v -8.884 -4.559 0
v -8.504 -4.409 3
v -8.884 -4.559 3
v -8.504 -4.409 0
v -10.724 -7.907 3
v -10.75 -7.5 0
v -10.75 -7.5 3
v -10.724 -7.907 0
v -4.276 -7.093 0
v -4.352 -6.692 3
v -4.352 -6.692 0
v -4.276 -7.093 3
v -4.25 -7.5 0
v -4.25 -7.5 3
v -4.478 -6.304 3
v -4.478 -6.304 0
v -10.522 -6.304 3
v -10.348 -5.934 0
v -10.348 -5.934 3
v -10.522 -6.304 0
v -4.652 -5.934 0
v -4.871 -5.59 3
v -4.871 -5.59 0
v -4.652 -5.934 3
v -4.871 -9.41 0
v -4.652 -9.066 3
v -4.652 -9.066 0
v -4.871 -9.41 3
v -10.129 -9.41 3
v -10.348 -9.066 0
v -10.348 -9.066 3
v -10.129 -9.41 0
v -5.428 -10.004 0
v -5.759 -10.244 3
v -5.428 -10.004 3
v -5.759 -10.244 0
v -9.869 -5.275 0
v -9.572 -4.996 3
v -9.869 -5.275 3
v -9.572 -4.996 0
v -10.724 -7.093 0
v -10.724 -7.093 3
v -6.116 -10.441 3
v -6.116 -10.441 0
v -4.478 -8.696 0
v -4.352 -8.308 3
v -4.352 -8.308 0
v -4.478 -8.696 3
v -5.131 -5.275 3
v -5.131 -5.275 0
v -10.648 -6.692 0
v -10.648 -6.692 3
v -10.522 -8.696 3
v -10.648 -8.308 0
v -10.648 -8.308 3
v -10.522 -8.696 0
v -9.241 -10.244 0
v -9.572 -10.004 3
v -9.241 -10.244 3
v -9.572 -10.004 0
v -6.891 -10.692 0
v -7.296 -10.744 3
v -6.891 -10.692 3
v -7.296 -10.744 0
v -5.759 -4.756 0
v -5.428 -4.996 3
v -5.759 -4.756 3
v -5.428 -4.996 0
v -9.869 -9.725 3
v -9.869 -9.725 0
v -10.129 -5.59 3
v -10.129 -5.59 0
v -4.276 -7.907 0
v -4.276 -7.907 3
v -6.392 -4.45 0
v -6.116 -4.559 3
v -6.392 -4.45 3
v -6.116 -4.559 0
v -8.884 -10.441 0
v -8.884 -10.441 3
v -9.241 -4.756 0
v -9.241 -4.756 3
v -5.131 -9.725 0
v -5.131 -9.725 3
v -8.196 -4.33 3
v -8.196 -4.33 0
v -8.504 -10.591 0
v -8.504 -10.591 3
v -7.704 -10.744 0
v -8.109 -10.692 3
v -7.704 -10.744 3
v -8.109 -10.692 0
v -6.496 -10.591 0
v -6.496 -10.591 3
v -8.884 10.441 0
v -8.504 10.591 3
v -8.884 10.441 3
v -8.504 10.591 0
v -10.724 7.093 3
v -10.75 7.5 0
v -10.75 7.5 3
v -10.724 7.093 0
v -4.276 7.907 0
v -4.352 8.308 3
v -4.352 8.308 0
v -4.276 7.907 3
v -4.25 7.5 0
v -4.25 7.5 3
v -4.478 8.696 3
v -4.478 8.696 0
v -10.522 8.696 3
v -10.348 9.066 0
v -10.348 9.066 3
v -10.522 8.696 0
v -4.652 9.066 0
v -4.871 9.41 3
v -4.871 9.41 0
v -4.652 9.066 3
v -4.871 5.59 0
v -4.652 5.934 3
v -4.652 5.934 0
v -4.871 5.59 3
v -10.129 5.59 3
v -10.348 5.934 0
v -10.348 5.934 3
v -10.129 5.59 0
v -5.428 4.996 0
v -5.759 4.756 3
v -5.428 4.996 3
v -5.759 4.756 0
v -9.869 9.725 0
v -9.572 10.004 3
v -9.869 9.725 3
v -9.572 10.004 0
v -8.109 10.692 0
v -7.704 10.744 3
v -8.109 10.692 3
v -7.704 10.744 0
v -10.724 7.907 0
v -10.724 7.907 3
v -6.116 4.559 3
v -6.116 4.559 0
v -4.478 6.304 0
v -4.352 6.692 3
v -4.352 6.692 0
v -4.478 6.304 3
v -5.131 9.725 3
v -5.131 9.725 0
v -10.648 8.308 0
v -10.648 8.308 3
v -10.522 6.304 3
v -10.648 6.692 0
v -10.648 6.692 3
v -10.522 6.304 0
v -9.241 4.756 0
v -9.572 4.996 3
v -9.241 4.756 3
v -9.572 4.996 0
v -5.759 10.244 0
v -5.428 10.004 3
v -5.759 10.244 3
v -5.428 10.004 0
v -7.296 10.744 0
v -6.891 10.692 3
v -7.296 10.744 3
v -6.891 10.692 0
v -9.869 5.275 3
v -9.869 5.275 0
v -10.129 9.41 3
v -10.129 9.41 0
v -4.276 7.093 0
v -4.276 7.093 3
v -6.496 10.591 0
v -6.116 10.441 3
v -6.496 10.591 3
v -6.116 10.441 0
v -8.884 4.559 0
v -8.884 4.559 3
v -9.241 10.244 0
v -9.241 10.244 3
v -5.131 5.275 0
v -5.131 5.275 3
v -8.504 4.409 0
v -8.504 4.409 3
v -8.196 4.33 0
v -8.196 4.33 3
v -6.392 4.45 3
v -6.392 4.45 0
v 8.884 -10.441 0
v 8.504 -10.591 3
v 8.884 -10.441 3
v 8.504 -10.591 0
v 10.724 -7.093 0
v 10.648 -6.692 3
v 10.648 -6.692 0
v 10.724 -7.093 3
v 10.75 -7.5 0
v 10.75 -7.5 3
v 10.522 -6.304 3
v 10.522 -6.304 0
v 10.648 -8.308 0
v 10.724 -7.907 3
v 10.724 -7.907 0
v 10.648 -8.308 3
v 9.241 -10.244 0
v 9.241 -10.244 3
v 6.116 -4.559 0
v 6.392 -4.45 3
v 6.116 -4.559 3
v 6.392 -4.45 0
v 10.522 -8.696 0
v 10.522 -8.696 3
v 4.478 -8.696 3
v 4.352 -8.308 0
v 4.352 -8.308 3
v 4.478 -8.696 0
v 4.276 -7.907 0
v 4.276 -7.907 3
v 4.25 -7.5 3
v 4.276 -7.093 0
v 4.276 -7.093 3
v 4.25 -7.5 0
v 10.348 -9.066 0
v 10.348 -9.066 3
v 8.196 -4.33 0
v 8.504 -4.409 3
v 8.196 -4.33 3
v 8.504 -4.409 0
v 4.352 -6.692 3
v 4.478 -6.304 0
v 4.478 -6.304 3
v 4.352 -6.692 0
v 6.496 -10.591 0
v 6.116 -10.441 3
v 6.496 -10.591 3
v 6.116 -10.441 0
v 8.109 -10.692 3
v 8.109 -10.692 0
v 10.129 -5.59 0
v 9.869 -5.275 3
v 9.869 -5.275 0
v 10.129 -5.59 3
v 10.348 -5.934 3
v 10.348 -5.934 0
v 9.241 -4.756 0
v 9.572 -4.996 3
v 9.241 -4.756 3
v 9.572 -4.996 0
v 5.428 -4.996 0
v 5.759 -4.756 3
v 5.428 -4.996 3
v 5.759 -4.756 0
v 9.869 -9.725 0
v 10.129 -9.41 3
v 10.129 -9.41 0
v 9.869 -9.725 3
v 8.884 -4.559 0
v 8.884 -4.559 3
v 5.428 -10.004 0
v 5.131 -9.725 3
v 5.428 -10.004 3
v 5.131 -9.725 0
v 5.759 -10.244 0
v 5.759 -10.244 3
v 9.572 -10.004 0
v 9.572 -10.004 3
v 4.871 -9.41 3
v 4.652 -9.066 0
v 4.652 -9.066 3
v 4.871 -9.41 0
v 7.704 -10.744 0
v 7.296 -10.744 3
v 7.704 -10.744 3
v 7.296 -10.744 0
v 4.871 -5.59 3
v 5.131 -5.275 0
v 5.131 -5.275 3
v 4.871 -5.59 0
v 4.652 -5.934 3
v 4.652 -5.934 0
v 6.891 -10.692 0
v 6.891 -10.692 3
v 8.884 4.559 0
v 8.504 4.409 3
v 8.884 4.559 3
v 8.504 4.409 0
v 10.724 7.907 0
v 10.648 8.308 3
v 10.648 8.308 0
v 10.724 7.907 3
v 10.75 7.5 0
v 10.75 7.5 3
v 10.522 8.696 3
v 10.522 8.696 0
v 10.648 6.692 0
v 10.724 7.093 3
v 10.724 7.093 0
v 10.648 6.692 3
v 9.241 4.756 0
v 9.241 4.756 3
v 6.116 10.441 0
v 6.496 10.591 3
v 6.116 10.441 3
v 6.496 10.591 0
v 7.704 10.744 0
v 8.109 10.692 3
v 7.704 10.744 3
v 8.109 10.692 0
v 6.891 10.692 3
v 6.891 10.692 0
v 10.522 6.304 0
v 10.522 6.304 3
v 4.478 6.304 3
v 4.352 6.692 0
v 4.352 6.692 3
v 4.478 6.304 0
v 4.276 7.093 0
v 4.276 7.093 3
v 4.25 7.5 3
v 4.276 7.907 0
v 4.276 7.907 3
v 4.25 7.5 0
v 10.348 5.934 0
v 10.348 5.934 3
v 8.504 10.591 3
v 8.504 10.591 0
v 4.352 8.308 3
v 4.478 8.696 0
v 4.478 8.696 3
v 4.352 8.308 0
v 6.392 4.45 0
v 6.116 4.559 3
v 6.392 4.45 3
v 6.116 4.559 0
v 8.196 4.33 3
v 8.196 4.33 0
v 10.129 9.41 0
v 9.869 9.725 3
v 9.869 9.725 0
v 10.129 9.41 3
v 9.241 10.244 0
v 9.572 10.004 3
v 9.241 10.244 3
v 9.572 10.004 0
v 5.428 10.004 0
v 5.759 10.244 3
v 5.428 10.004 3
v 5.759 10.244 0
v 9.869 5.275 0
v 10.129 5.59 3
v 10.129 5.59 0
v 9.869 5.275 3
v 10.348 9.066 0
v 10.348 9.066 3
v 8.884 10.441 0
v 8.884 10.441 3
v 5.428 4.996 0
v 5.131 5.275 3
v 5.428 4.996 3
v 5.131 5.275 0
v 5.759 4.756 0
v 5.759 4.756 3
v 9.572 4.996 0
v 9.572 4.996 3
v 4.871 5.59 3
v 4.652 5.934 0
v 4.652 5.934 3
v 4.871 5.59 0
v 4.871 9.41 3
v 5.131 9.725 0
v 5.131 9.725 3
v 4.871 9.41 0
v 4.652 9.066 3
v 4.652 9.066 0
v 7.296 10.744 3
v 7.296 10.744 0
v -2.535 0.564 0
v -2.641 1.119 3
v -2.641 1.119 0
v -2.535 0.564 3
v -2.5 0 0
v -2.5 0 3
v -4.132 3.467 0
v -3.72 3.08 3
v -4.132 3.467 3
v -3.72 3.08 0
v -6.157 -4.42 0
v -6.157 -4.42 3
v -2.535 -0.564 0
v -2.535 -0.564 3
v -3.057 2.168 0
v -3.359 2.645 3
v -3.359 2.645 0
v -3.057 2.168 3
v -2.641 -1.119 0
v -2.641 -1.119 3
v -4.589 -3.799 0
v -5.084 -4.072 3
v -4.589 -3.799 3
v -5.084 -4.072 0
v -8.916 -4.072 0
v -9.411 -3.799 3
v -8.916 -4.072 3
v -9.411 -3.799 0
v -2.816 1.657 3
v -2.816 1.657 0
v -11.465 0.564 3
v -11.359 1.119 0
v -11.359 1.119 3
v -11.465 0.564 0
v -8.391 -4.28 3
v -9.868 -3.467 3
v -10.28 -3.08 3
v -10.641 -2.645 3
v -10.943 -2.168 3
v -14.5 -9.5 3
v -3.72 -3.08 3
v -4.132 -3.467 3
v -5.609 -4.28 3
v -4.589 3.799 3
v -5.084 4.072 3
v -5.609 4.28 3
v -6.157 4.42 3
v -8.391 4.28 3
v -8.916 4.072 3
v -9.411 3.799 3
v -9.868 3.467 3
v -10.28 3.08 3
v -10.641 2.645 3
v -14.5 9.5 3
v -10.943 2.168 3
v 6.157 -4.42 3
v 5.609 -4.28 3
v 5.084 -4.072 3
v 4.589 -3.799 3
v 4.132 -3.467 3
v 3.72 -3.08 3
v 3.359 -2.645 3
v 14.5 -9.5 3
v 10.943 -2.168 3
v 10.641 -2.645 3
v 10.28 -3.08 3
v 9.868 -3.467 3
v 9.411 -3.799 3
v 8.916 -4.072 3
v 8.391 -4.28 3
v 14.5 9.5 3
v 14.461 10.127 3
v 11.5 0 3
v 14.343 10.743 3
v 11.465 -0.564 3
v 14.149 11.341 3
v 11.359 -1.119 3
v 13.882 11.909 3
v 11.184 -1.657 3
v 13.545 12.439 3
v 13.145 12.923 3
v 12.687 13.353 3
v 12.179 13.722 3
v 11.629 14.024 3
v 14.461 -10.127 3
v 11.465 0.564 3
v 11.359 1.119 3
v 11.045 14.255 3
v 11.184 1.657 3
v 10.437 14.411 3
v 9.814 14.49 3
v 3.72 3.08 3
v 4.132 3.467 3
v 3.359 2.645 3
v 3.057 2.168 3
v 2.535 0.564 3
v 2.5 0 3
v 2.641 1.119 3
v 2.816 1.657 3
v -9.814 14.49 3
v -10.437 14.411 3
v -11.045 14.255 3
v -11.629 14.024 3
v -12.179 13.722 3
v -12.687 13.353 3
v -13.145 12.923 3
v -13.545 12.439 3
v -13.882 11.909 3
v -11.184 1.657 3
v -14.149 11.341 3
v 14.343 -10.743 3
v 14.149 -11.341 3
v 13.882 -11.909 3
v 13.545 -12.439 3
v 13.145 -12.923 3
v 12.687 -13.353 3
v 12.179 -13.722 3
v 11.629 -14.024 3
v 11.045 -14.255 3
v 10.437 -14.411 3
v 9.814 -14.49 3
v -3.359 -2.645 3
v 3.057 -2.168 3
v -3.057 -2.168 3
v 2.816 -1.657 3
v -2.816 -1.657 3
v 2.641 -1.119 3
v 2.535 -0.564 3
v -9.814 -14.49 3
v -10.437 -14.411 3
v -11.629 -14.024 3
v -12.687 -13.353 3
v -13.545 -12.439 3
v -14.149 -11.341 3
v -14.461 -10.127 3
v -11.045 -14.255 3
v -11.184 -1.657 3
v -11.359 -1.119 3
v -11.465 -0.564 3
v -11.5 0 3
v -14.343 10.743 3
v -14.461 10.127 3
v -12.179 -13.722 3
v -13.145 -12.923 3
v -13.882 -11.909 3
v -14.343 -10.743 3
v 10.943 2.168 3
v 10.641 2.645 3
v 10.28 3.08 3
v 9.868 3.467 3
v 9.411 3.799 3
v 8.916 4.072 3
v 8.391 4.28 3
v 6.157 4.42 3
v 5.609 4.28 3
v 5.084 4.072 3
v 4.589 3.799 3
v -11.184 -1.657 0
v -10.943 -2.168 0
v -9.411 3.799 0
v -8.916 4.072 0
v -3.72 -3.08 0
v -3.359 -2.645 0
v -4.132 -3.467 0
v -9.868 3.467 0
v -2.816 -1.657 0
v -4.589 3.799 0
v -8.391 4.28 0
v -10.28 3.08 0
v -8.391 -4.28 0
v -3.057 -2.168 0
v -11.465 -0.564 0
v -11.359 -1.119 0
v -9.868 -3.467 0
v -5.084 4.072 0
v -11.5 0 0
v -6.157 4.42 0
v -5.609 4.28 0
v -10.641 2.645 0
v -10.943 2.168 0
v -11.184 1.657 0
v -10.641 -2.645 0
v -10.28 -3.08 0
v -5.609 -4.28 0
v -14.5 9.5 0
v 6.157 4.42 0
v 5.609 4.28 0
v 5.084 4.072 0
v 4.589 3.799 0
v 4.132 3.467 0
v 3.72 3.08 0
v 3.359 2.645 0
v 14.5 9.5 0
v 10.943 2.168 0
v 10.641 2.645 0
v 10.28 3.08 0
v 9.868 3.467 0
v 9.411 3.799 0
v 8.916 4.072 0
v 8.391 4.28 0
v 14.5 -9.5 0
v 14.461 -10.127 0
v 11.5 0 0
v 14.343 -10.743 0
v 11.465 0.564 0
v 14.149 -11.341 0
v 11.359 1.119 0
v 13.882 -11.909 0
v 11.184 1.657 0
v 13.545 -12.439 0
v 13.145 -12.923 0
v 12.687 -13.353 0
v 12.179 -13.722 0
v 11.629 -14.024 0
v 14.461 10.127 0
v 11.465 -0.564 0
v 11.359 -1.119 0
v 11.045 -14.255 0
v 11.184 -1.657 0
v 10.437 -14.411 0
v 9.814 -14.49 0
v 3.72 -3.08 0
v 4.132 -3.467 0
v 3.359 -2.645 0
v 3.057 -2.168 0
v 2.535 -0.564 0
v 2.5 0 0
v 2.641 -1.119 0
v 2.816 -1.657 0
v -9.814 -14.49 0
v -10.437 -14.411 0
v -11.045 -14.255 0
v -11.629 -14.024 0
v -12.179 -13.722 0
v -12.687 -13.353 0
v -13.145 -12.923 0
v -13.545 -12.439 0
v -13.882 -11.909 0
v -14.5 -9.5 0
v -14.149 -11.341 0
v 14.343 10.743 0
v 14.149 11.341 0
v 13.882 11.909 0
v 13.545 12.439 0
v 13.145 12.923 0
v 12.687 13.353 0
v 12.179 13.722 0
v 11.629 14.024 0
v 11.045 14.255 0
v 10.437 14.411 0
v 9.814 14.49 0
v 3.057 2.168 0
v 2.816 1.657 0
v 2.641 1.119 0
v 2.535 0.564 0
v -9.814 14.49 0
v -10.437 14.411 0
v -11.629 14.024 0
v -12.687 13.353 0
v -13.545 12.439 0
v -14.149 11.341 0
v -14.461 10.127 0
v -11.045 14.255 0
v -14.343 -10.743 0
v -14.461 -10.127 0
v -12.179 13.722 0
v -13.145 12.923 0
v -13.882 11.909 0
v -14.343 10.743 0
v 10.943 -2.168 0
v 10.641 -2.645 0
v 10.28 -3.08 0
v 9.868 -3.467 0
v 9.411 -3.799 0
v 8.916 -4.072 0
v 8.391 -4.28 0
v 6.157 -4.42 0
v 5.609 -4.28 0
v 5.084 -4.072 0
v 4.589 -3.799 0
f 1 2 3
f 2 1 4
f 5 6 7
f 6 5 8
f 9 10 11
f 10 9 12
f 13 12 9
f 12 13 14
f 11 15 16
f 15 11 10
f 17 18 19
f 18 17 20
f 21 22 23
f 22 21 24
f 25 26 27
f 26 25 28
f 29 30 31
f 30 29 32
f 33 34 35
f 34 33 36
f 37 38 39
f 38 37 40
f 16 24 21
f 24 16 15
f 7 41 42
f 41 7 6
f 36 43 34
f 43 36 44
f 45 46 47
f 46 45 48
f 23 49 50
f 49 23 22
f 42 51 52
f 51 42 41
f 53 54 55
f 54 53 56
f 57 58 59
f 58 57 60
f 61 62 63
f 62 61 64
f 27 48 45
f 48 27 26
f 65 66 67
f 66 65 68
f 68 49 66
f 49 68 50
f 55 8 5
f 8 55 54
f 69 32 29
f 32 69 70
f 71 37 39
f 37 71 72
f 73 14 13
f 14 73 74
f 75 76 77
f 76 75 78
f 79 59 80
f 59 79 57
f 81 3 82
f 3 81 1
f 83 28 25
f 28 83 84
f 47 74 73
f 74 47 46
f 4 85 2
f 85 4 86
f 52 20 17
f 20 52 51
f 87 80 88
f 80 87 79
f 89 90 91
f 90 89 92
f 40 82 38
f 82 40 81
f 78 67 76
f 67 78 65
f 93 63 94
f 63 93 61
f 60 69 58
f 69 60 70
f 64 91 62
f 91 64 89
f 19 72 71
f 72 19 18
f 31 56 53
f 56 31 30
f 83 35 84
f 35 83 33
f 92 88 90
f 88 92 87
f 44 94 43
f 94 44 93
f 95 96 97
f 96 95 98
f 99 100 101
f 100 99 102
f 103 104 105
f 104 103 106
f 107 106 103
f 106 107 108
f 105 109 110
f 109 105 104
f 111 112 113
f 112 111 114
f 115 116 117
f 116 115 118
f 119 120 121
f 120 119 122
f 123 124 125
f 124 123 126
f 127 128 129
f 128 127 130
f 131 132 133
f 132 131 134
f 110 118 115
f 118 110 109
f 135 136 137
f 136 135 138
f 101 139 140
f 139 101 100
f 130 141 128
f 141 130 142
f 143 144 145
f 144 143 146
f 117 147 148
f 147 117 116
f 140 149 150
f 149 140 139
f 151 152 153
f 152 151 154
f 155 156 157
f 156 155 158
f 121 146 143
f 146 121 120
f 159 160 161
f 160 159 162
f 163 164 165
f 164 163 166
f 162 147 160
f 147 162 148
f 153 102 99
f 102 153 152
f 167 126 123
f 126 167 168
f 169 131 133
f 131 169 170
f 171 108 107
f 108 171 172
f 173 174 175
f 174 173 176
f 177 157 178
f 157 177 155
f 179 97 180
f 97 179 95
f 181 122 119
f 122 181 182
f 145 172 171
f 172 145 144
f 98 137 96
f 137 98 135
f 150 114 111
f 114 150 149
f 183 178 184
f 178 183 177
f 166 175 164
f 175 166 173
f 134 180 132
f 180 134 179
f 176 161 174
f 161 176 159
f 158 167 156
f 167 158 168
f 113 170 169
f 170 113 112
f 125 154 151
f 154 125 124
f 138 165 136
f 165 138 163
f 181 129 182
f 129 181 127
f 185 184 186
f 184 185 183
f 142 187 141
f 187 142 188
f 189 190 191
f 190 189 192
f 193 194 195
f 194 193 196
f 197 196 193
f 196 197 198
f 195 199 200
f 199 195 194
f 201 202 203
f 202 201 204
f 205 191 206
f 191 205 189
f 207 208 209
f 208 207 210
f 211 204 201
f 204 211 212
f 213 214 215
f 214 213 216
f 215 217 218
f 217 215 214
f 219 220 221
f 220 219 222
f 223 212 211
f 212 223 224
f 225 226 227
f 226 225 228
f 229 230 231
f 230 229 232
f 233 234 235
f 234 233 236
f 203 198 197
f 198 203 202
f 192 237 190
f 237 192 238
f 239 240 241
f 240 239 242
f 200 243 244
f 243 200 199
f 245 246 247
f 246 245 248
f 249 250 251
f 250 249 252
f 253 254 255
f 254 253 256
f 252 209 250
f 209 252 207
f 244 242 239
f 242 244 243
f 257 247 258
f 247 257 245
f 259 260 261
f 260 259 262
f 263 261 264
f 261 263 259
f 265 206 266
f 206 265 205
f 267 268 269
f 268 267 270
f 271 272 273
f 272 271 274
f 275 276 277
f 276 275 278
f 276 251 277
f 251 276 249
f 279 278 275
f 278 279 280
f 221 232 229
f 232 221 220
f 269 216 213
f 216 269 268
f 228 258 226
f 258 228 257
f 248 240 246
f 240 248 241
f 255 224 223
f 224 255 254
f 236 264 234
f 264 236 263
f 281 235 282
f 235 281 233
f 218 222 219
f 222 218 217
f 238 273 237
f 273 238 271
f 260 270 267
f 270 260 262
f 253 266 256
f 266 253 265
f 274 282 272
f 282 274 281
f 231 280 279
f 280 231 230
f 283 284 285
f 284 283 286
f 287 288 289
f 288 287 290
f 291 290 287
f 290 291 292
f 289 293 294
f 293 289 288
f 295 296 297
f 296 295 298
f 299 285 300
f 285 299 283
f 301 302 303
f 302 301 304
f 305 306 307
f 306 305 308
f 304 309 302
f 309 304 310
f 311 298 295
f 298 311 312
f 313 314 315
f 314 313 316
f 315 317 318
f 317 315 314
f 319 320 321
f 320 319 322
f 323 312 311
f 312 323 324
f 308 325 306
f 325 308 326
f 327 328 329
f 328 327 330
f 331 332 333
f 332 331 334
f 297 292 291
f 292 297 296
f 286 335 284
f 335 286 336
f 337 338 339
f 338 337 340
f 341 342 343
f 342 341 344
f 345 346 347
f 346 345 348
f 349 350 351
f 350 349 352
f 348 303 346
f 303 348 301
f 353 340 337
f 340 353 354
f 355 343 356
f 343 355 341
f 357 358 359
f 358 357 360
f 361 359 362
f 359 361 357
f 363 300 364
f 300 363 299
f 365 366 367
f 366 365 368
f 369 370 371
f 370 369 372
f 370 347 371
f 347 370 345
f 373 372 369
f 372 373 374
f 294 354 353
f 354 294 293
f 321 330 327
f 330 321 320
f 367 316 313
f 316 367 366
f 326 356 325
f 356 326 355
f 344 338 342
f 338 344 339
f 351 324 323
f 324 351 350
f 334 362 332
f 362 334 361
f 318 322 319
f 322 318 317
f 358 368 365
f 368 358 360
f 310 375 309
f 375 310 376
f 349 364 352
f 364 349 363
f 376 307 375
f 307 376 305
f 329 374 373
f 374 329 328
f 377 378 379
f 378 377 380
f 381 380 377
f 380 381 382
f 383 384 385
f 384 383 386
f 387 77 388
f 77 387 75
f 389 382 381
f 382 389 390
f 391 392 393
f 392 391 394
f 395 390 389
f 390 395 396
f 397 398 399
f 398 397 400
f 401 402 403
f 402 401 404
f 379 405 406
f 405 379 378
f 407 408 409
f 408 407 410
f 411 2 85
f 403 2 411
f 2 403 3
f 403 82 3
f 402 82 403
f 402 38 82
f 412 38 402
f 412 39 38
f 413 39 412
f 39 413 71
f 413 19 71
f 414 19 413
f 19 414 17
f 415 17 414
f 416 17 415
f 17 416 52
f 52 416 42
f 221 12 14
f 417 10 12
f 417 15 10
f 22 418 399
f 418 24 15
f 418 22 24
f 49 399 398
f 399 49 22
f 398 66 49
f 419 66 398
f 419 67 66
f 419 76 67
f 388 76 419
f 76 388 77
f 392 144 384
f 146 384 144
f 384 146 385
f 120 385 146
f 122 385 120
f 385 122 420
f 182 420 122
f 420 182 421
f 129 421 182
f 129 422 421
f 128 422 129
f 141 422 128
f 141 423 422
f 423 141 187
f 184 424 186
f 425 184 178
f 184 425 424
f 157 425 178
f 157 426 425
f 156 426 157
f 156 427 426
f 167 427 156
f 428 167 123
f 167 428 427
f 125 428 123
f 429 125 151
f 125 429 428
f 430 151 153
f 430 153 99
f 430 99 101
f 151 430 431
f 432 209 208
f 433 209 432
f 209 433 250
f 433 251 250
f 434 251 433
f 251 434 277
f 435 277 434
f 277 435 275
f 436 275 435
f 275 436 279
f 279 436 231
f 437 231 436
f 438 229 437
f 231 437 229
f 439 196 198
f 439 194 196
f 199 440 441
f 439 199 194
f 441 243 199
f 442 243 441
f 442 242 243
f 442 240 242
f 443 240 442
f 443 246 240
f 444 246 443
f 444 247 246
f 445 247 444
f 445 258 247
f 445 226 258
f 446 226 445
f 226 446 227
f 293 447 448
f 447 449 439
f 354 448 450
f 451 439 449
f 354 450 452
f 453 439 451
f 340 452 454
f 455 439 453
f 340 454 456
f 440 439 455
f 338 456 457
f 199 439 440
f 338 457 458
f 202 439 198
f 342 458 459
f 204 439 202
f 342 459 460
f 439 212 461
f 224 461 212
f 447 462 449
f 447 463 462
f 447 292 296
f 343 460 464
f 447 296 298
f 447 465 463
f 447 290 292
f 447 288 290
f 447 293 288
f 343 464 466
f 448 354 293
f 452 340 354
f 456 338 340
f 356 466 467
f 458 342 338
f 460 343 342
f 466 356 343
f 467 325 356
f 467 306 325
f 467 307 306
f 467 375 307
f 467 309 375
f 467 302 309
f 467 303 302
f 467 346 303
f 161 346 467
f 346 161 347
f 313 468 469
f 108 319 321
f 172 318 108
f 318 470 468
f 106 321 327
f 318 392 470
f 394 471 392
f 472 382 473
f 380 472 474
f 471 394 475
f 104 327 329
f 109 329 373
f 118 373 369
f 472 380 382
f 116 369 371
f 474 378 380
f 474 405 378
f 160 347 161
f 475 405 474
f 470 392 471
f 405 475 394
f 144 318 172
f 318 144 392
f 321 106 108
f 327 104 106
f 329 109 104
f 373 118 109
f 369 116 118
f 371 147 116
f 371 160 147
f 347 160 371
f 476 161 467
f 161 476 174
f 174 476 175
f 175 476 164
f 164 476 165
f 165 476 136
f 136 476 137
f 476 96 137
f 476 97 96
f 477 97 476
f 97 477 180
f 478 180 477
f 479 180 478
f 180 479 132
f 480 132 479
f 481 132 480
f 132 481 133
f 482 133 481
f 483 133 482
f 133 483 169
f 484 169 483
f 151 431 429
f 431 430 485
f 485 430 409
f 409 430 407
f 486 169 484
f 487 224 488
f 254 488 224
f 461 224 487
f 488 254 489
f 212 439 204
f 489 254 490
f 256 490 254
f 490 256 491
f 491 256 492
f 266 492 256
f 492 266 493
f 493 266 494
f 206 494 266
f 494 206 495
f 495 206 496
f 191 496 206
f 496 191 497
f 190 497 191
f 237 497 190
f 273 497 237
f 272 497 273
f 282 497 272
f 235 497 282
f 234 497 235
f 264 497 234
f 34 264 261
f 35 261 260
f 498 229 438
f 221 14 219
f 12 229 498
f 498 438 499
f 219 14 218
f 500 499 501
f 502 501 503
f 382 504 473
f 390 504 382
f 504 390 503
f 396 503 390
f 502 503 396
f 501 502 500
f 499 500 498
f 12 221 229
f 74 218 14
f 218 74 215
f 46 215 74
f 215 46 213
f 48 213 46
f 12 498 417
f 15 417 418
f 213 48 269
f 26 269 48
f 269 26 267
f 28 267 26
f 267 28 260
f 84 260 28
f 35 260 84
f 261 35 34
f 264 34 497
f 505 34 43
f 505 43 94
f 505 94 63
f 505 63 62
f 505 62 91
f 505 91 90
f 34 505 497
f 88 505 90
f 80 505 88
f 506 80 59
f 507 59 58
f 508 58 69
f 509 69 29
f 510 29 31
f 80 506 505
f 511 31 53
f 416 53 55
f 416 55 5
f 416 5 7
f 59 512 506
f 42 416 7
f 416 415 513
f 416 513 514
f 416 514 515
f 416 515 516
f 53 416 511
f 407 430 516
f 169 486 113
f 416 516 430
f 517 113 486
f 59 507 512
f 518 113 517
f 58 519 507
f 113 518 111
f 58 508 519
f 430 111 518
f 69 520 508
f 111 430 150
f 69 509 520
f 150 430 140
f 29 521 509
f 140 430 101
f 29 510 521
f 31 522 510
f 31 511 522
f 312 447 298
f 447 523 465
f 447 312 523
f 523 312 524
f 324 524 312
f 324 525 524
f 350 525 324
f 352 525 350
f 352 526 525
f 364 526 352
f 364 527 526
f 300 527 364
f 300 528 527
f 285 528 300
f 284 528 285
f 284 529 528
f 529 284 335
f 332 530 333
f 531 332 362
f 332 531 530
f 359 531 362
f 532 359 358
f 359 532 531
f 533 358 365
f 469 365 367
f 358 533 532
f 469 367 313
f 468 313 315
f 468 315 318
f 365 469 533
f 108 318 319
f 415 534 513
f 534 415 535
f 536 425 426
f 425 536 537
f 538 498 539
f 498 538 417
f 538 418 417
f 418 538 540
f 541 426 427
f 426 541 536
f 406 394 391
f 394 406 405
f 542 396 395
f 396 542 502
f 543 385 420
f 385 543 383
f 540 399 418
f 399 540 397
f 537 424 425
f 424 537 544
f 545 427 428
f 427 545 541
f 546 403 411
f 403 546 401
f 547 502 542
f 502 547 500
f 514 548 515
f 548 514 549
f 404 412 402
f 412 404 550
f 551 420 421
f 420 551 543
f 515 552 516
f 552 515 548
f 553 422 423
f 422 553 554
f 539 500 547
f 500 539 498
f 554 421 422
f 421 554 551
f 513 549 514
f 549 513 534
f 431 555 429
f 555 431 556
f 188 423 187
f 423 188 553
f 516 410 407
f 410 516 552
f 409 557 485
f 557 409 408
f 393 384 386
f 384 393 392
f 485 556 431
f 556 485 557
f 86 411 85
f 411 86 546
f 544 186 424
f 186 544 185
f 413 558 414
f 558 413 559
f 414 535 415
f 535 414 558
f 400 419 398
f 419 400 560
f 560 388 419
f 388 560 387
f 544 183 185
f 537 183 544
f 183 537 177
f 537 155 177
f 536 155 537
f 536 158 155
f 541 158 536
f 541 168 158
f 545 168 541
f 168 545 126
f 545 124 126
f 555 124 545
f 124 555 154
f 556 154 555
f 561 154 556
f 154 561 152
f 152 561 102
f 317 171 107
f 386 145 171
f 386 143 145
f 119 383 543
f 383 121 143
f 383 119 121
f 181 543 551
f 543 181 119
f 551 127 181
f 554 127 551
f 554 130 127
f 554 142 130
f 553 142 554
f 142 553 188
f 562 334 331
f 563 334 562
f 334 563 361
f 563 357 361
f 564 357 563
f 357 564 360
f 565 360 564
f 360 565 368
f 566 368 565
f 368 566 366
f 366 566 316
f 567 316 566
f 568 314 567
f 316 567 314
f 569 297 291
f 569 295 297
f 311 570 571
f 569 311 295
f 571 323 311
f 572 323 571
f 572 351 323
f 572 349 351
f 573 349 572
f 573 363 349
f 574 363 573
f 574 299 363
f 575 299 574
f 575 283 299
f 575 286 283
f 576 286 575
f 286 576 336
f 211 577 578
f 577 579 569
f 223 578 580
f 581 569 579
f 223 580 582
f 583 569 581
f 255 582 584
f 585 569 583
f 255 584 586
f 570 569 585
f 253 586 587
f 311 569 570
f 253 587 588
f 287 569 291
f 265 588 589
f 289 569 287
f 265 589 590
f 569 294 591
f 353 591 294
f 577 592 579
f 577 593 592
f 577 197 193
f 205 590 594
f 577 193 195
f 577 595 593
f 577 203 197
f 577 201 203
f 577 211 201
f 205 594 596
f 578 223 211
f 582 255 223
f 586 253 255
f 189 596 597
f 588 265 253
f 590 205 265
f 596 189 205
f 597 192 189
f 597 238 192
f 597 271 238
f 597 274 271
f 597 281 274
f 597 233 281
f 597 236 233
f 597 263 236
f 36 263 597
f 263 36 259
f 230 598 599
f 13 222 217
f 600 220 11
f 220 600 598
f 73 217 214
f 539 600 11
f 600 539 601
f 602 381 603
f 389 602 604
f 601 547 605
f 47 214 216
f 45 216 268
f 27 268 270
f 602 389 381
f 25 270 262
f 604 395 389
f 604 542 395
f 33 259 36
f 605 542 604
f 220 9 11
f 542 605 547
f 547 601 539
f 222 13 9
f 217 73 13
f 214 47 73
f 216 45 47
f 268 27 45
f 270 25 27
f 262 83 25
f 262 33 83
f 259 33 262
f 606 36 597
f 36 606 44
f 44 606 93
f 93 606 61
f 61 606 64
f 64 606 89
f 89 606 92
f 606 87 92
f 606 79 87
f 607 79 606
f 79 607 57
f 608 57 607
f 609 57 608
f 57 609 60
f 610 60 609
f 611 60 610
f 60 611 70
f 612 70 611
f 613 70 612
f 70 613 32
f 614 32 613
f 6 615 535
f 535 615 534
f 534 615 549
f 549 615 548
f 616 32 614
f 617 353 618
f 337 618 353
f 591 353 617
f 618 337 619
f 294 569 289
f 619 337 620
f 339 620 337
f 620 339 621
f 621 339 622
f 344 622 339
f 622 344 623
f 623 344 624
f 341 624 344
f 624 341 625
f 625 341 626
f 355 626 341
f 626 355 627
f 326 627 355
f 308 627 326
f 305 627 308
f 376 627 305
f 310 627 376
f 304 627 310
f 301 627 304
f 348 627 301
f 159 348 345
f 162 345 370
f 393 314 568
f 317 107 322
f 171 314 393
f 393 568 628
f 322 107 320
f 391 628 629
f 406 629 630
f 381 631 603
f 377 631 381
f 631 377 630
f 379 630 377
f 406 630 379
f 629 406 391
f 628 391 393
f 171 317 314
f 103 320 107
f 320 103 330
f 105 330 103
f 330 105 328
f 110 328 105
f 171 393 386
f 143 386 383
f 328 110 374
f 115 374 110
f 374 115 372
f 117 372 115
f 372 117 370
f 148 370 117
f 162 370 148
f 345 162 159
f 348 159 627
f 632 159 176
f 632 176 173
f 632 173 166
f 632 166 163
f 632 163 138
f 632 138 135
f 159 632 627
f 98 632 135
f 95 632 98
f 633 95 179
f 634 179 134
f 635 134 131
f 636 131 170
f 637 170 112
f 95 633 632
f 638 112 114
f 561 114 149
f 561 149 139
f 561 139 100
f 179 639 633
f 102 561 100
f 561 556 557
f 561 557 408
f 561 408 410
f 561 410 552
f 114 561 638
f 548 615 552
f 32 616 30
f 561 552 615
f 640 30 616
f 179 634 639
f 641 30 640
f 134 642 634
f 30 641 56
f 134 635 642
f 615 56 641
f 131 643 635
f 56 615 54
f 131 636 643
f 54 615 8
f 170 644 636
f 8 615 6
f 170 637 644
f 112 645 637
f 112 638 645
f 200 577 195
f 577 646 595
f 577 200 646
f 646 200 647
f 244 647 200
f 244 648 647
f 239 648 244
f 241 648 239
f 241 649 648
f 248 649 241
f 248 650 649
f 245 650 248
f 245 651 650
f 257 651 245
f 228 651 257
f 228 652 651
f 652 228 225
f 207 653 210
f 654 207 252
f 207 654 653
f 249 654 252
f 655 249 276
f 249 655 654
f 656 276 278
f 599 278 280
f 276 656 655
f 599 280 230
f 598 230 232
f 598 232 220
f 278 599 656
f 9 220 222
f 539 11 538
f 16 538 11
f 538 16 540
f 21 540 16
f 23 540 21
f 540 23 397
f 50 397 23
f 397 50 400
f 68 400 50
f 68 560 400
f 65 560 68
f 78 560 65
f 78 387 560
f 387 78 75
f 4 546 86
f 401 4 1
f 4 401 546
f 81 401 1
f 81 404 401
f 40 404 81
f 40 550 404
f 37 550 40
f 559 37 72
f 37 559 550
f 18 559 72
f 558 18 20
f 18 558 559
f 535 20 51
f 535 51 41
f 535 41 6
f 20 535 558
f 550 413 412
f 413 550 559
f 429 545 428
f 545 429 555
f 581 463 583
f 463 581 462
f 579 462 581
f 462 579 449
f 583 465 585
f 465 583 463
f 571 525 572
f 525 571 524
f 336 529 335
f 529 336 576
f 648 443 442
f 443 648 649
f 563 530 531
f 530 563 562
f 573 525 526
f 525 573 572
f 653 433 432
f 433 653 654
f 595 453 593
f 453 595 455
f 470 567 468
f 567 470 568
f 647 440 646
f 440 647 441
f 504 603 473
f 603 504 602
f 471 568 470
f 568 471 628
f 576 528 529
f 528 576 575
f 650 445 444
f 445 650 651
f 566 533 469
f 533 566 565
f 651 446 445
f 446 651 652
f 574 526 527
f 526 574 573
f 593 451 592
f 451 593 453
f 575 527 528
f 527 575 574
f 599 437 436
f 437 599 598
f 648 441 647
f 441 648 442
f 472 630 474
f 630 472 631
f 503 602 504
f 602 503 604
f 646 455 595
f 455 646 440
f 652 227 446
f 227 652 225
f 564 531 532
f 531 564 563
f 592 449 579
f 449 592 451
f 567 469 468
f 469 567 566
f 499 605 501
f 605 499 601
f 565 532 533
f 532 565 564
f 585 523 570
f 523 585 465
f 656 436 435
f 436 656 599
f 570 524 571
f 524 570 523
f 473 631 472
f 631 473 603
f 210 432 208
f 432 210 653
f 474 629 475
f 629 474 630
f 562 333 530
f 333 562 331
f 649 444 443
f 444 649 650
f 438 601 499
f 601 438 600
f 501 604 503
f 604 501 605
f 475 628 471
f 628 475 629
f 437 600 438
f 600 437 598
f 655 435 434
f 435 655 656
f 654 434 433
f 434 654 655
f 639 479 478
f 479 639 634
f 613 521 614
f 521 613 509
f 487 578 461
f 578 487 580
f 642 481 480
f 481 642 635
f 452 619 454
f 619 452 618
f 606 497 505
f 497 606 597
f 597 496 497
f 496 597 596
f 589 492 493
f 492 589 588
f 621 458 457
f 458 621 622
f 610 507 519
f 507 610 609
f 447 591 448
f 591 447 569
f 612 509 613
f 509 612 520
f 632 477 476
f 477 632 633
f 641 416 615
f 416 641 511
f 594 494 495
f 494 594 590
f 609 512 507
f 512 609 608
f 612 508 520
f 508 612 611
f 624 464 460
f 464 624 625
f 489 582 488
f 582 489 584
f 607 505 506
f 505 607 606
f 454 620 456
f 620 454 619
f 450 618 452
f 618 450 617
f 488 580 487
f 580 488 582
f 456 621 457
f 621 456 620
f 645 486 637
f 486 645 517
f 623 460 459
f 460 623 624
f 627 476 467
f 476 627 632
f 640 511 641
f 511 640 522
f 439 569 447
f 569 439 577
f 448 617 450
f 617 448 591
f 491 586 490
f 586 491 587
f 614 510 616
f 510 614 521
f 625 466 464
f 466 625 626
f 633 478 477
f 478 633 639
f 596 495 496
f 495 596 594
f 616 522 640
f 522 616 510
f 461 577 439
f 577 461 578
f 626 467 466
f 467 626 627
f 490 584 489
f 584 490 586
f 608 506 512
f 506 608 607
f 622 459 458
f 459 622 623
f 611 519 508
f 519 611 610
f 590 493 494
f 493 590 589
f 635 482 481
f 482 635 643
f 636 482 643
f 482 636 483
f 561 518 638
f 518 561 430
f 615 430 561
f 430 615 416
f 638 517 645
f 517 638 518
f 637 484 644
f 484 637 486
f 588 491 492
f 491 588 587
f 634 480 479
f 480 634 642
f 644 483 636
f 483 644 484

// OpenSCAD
$fn = 50;

difference() {
	union() {
		hull() {
			translate(v = [-9.5, 9.5, 0]) {
				cylinder(h = 3, r = 5);
			}
			translate(v = [9.5, 9.5, 0]) {
				cylinder(h = 3, r = 5);
			}
			translate(v = [-9.5, -9.5, 0]) {
				cylinder(h = 3, r = 5);
			}
			translate(v = [9.5, -9.5, 0]) {
				cylinder(h = 3, r = 5);
			}
		}
	}
	union() {
		translate(v = [-7.5, -7.5, -100.0]) {
			cylinder(h = 200, r = 3.25);
		}
		translate(v = [-7.5, 7.5, -100.0]) {
			cylinder(h = 200, r = 3.25);
		}
		translate(v = [7.5, -7.5, -100.0]) {
			cylinder(h = 200, r = 3.25);
		}
		translate(v = [7.5, 7.5, -100.0]) {
			cylinder(h = 200, r = 3.25);
		}
		translate(v = [-7.5, -7.5, -100.0]) {
			cylinder(h = 200, r = 1.8);
		}
		translate(v = [-7.5, 7.5, -100.0]) {
			cylinder(h = 200, r = 1.8);
		}
		translate(v = [7.5, -7.5, -100.0]) {
			cylinder(h = 200, r = 1.8);
		}
		translate(v = [7.5, 7.5, -100.0]) {
			cylinder(h = 200, r = 1.8);
		}
		translate(v = [-7.0, 0, 0.0]) {
			cylinder(h = 3, r = 4.5);
		}
		translate(v = [7.0, 0, 0.0]) {
			cylinder(h = 3, r = 4.5);
		}
	}
}
